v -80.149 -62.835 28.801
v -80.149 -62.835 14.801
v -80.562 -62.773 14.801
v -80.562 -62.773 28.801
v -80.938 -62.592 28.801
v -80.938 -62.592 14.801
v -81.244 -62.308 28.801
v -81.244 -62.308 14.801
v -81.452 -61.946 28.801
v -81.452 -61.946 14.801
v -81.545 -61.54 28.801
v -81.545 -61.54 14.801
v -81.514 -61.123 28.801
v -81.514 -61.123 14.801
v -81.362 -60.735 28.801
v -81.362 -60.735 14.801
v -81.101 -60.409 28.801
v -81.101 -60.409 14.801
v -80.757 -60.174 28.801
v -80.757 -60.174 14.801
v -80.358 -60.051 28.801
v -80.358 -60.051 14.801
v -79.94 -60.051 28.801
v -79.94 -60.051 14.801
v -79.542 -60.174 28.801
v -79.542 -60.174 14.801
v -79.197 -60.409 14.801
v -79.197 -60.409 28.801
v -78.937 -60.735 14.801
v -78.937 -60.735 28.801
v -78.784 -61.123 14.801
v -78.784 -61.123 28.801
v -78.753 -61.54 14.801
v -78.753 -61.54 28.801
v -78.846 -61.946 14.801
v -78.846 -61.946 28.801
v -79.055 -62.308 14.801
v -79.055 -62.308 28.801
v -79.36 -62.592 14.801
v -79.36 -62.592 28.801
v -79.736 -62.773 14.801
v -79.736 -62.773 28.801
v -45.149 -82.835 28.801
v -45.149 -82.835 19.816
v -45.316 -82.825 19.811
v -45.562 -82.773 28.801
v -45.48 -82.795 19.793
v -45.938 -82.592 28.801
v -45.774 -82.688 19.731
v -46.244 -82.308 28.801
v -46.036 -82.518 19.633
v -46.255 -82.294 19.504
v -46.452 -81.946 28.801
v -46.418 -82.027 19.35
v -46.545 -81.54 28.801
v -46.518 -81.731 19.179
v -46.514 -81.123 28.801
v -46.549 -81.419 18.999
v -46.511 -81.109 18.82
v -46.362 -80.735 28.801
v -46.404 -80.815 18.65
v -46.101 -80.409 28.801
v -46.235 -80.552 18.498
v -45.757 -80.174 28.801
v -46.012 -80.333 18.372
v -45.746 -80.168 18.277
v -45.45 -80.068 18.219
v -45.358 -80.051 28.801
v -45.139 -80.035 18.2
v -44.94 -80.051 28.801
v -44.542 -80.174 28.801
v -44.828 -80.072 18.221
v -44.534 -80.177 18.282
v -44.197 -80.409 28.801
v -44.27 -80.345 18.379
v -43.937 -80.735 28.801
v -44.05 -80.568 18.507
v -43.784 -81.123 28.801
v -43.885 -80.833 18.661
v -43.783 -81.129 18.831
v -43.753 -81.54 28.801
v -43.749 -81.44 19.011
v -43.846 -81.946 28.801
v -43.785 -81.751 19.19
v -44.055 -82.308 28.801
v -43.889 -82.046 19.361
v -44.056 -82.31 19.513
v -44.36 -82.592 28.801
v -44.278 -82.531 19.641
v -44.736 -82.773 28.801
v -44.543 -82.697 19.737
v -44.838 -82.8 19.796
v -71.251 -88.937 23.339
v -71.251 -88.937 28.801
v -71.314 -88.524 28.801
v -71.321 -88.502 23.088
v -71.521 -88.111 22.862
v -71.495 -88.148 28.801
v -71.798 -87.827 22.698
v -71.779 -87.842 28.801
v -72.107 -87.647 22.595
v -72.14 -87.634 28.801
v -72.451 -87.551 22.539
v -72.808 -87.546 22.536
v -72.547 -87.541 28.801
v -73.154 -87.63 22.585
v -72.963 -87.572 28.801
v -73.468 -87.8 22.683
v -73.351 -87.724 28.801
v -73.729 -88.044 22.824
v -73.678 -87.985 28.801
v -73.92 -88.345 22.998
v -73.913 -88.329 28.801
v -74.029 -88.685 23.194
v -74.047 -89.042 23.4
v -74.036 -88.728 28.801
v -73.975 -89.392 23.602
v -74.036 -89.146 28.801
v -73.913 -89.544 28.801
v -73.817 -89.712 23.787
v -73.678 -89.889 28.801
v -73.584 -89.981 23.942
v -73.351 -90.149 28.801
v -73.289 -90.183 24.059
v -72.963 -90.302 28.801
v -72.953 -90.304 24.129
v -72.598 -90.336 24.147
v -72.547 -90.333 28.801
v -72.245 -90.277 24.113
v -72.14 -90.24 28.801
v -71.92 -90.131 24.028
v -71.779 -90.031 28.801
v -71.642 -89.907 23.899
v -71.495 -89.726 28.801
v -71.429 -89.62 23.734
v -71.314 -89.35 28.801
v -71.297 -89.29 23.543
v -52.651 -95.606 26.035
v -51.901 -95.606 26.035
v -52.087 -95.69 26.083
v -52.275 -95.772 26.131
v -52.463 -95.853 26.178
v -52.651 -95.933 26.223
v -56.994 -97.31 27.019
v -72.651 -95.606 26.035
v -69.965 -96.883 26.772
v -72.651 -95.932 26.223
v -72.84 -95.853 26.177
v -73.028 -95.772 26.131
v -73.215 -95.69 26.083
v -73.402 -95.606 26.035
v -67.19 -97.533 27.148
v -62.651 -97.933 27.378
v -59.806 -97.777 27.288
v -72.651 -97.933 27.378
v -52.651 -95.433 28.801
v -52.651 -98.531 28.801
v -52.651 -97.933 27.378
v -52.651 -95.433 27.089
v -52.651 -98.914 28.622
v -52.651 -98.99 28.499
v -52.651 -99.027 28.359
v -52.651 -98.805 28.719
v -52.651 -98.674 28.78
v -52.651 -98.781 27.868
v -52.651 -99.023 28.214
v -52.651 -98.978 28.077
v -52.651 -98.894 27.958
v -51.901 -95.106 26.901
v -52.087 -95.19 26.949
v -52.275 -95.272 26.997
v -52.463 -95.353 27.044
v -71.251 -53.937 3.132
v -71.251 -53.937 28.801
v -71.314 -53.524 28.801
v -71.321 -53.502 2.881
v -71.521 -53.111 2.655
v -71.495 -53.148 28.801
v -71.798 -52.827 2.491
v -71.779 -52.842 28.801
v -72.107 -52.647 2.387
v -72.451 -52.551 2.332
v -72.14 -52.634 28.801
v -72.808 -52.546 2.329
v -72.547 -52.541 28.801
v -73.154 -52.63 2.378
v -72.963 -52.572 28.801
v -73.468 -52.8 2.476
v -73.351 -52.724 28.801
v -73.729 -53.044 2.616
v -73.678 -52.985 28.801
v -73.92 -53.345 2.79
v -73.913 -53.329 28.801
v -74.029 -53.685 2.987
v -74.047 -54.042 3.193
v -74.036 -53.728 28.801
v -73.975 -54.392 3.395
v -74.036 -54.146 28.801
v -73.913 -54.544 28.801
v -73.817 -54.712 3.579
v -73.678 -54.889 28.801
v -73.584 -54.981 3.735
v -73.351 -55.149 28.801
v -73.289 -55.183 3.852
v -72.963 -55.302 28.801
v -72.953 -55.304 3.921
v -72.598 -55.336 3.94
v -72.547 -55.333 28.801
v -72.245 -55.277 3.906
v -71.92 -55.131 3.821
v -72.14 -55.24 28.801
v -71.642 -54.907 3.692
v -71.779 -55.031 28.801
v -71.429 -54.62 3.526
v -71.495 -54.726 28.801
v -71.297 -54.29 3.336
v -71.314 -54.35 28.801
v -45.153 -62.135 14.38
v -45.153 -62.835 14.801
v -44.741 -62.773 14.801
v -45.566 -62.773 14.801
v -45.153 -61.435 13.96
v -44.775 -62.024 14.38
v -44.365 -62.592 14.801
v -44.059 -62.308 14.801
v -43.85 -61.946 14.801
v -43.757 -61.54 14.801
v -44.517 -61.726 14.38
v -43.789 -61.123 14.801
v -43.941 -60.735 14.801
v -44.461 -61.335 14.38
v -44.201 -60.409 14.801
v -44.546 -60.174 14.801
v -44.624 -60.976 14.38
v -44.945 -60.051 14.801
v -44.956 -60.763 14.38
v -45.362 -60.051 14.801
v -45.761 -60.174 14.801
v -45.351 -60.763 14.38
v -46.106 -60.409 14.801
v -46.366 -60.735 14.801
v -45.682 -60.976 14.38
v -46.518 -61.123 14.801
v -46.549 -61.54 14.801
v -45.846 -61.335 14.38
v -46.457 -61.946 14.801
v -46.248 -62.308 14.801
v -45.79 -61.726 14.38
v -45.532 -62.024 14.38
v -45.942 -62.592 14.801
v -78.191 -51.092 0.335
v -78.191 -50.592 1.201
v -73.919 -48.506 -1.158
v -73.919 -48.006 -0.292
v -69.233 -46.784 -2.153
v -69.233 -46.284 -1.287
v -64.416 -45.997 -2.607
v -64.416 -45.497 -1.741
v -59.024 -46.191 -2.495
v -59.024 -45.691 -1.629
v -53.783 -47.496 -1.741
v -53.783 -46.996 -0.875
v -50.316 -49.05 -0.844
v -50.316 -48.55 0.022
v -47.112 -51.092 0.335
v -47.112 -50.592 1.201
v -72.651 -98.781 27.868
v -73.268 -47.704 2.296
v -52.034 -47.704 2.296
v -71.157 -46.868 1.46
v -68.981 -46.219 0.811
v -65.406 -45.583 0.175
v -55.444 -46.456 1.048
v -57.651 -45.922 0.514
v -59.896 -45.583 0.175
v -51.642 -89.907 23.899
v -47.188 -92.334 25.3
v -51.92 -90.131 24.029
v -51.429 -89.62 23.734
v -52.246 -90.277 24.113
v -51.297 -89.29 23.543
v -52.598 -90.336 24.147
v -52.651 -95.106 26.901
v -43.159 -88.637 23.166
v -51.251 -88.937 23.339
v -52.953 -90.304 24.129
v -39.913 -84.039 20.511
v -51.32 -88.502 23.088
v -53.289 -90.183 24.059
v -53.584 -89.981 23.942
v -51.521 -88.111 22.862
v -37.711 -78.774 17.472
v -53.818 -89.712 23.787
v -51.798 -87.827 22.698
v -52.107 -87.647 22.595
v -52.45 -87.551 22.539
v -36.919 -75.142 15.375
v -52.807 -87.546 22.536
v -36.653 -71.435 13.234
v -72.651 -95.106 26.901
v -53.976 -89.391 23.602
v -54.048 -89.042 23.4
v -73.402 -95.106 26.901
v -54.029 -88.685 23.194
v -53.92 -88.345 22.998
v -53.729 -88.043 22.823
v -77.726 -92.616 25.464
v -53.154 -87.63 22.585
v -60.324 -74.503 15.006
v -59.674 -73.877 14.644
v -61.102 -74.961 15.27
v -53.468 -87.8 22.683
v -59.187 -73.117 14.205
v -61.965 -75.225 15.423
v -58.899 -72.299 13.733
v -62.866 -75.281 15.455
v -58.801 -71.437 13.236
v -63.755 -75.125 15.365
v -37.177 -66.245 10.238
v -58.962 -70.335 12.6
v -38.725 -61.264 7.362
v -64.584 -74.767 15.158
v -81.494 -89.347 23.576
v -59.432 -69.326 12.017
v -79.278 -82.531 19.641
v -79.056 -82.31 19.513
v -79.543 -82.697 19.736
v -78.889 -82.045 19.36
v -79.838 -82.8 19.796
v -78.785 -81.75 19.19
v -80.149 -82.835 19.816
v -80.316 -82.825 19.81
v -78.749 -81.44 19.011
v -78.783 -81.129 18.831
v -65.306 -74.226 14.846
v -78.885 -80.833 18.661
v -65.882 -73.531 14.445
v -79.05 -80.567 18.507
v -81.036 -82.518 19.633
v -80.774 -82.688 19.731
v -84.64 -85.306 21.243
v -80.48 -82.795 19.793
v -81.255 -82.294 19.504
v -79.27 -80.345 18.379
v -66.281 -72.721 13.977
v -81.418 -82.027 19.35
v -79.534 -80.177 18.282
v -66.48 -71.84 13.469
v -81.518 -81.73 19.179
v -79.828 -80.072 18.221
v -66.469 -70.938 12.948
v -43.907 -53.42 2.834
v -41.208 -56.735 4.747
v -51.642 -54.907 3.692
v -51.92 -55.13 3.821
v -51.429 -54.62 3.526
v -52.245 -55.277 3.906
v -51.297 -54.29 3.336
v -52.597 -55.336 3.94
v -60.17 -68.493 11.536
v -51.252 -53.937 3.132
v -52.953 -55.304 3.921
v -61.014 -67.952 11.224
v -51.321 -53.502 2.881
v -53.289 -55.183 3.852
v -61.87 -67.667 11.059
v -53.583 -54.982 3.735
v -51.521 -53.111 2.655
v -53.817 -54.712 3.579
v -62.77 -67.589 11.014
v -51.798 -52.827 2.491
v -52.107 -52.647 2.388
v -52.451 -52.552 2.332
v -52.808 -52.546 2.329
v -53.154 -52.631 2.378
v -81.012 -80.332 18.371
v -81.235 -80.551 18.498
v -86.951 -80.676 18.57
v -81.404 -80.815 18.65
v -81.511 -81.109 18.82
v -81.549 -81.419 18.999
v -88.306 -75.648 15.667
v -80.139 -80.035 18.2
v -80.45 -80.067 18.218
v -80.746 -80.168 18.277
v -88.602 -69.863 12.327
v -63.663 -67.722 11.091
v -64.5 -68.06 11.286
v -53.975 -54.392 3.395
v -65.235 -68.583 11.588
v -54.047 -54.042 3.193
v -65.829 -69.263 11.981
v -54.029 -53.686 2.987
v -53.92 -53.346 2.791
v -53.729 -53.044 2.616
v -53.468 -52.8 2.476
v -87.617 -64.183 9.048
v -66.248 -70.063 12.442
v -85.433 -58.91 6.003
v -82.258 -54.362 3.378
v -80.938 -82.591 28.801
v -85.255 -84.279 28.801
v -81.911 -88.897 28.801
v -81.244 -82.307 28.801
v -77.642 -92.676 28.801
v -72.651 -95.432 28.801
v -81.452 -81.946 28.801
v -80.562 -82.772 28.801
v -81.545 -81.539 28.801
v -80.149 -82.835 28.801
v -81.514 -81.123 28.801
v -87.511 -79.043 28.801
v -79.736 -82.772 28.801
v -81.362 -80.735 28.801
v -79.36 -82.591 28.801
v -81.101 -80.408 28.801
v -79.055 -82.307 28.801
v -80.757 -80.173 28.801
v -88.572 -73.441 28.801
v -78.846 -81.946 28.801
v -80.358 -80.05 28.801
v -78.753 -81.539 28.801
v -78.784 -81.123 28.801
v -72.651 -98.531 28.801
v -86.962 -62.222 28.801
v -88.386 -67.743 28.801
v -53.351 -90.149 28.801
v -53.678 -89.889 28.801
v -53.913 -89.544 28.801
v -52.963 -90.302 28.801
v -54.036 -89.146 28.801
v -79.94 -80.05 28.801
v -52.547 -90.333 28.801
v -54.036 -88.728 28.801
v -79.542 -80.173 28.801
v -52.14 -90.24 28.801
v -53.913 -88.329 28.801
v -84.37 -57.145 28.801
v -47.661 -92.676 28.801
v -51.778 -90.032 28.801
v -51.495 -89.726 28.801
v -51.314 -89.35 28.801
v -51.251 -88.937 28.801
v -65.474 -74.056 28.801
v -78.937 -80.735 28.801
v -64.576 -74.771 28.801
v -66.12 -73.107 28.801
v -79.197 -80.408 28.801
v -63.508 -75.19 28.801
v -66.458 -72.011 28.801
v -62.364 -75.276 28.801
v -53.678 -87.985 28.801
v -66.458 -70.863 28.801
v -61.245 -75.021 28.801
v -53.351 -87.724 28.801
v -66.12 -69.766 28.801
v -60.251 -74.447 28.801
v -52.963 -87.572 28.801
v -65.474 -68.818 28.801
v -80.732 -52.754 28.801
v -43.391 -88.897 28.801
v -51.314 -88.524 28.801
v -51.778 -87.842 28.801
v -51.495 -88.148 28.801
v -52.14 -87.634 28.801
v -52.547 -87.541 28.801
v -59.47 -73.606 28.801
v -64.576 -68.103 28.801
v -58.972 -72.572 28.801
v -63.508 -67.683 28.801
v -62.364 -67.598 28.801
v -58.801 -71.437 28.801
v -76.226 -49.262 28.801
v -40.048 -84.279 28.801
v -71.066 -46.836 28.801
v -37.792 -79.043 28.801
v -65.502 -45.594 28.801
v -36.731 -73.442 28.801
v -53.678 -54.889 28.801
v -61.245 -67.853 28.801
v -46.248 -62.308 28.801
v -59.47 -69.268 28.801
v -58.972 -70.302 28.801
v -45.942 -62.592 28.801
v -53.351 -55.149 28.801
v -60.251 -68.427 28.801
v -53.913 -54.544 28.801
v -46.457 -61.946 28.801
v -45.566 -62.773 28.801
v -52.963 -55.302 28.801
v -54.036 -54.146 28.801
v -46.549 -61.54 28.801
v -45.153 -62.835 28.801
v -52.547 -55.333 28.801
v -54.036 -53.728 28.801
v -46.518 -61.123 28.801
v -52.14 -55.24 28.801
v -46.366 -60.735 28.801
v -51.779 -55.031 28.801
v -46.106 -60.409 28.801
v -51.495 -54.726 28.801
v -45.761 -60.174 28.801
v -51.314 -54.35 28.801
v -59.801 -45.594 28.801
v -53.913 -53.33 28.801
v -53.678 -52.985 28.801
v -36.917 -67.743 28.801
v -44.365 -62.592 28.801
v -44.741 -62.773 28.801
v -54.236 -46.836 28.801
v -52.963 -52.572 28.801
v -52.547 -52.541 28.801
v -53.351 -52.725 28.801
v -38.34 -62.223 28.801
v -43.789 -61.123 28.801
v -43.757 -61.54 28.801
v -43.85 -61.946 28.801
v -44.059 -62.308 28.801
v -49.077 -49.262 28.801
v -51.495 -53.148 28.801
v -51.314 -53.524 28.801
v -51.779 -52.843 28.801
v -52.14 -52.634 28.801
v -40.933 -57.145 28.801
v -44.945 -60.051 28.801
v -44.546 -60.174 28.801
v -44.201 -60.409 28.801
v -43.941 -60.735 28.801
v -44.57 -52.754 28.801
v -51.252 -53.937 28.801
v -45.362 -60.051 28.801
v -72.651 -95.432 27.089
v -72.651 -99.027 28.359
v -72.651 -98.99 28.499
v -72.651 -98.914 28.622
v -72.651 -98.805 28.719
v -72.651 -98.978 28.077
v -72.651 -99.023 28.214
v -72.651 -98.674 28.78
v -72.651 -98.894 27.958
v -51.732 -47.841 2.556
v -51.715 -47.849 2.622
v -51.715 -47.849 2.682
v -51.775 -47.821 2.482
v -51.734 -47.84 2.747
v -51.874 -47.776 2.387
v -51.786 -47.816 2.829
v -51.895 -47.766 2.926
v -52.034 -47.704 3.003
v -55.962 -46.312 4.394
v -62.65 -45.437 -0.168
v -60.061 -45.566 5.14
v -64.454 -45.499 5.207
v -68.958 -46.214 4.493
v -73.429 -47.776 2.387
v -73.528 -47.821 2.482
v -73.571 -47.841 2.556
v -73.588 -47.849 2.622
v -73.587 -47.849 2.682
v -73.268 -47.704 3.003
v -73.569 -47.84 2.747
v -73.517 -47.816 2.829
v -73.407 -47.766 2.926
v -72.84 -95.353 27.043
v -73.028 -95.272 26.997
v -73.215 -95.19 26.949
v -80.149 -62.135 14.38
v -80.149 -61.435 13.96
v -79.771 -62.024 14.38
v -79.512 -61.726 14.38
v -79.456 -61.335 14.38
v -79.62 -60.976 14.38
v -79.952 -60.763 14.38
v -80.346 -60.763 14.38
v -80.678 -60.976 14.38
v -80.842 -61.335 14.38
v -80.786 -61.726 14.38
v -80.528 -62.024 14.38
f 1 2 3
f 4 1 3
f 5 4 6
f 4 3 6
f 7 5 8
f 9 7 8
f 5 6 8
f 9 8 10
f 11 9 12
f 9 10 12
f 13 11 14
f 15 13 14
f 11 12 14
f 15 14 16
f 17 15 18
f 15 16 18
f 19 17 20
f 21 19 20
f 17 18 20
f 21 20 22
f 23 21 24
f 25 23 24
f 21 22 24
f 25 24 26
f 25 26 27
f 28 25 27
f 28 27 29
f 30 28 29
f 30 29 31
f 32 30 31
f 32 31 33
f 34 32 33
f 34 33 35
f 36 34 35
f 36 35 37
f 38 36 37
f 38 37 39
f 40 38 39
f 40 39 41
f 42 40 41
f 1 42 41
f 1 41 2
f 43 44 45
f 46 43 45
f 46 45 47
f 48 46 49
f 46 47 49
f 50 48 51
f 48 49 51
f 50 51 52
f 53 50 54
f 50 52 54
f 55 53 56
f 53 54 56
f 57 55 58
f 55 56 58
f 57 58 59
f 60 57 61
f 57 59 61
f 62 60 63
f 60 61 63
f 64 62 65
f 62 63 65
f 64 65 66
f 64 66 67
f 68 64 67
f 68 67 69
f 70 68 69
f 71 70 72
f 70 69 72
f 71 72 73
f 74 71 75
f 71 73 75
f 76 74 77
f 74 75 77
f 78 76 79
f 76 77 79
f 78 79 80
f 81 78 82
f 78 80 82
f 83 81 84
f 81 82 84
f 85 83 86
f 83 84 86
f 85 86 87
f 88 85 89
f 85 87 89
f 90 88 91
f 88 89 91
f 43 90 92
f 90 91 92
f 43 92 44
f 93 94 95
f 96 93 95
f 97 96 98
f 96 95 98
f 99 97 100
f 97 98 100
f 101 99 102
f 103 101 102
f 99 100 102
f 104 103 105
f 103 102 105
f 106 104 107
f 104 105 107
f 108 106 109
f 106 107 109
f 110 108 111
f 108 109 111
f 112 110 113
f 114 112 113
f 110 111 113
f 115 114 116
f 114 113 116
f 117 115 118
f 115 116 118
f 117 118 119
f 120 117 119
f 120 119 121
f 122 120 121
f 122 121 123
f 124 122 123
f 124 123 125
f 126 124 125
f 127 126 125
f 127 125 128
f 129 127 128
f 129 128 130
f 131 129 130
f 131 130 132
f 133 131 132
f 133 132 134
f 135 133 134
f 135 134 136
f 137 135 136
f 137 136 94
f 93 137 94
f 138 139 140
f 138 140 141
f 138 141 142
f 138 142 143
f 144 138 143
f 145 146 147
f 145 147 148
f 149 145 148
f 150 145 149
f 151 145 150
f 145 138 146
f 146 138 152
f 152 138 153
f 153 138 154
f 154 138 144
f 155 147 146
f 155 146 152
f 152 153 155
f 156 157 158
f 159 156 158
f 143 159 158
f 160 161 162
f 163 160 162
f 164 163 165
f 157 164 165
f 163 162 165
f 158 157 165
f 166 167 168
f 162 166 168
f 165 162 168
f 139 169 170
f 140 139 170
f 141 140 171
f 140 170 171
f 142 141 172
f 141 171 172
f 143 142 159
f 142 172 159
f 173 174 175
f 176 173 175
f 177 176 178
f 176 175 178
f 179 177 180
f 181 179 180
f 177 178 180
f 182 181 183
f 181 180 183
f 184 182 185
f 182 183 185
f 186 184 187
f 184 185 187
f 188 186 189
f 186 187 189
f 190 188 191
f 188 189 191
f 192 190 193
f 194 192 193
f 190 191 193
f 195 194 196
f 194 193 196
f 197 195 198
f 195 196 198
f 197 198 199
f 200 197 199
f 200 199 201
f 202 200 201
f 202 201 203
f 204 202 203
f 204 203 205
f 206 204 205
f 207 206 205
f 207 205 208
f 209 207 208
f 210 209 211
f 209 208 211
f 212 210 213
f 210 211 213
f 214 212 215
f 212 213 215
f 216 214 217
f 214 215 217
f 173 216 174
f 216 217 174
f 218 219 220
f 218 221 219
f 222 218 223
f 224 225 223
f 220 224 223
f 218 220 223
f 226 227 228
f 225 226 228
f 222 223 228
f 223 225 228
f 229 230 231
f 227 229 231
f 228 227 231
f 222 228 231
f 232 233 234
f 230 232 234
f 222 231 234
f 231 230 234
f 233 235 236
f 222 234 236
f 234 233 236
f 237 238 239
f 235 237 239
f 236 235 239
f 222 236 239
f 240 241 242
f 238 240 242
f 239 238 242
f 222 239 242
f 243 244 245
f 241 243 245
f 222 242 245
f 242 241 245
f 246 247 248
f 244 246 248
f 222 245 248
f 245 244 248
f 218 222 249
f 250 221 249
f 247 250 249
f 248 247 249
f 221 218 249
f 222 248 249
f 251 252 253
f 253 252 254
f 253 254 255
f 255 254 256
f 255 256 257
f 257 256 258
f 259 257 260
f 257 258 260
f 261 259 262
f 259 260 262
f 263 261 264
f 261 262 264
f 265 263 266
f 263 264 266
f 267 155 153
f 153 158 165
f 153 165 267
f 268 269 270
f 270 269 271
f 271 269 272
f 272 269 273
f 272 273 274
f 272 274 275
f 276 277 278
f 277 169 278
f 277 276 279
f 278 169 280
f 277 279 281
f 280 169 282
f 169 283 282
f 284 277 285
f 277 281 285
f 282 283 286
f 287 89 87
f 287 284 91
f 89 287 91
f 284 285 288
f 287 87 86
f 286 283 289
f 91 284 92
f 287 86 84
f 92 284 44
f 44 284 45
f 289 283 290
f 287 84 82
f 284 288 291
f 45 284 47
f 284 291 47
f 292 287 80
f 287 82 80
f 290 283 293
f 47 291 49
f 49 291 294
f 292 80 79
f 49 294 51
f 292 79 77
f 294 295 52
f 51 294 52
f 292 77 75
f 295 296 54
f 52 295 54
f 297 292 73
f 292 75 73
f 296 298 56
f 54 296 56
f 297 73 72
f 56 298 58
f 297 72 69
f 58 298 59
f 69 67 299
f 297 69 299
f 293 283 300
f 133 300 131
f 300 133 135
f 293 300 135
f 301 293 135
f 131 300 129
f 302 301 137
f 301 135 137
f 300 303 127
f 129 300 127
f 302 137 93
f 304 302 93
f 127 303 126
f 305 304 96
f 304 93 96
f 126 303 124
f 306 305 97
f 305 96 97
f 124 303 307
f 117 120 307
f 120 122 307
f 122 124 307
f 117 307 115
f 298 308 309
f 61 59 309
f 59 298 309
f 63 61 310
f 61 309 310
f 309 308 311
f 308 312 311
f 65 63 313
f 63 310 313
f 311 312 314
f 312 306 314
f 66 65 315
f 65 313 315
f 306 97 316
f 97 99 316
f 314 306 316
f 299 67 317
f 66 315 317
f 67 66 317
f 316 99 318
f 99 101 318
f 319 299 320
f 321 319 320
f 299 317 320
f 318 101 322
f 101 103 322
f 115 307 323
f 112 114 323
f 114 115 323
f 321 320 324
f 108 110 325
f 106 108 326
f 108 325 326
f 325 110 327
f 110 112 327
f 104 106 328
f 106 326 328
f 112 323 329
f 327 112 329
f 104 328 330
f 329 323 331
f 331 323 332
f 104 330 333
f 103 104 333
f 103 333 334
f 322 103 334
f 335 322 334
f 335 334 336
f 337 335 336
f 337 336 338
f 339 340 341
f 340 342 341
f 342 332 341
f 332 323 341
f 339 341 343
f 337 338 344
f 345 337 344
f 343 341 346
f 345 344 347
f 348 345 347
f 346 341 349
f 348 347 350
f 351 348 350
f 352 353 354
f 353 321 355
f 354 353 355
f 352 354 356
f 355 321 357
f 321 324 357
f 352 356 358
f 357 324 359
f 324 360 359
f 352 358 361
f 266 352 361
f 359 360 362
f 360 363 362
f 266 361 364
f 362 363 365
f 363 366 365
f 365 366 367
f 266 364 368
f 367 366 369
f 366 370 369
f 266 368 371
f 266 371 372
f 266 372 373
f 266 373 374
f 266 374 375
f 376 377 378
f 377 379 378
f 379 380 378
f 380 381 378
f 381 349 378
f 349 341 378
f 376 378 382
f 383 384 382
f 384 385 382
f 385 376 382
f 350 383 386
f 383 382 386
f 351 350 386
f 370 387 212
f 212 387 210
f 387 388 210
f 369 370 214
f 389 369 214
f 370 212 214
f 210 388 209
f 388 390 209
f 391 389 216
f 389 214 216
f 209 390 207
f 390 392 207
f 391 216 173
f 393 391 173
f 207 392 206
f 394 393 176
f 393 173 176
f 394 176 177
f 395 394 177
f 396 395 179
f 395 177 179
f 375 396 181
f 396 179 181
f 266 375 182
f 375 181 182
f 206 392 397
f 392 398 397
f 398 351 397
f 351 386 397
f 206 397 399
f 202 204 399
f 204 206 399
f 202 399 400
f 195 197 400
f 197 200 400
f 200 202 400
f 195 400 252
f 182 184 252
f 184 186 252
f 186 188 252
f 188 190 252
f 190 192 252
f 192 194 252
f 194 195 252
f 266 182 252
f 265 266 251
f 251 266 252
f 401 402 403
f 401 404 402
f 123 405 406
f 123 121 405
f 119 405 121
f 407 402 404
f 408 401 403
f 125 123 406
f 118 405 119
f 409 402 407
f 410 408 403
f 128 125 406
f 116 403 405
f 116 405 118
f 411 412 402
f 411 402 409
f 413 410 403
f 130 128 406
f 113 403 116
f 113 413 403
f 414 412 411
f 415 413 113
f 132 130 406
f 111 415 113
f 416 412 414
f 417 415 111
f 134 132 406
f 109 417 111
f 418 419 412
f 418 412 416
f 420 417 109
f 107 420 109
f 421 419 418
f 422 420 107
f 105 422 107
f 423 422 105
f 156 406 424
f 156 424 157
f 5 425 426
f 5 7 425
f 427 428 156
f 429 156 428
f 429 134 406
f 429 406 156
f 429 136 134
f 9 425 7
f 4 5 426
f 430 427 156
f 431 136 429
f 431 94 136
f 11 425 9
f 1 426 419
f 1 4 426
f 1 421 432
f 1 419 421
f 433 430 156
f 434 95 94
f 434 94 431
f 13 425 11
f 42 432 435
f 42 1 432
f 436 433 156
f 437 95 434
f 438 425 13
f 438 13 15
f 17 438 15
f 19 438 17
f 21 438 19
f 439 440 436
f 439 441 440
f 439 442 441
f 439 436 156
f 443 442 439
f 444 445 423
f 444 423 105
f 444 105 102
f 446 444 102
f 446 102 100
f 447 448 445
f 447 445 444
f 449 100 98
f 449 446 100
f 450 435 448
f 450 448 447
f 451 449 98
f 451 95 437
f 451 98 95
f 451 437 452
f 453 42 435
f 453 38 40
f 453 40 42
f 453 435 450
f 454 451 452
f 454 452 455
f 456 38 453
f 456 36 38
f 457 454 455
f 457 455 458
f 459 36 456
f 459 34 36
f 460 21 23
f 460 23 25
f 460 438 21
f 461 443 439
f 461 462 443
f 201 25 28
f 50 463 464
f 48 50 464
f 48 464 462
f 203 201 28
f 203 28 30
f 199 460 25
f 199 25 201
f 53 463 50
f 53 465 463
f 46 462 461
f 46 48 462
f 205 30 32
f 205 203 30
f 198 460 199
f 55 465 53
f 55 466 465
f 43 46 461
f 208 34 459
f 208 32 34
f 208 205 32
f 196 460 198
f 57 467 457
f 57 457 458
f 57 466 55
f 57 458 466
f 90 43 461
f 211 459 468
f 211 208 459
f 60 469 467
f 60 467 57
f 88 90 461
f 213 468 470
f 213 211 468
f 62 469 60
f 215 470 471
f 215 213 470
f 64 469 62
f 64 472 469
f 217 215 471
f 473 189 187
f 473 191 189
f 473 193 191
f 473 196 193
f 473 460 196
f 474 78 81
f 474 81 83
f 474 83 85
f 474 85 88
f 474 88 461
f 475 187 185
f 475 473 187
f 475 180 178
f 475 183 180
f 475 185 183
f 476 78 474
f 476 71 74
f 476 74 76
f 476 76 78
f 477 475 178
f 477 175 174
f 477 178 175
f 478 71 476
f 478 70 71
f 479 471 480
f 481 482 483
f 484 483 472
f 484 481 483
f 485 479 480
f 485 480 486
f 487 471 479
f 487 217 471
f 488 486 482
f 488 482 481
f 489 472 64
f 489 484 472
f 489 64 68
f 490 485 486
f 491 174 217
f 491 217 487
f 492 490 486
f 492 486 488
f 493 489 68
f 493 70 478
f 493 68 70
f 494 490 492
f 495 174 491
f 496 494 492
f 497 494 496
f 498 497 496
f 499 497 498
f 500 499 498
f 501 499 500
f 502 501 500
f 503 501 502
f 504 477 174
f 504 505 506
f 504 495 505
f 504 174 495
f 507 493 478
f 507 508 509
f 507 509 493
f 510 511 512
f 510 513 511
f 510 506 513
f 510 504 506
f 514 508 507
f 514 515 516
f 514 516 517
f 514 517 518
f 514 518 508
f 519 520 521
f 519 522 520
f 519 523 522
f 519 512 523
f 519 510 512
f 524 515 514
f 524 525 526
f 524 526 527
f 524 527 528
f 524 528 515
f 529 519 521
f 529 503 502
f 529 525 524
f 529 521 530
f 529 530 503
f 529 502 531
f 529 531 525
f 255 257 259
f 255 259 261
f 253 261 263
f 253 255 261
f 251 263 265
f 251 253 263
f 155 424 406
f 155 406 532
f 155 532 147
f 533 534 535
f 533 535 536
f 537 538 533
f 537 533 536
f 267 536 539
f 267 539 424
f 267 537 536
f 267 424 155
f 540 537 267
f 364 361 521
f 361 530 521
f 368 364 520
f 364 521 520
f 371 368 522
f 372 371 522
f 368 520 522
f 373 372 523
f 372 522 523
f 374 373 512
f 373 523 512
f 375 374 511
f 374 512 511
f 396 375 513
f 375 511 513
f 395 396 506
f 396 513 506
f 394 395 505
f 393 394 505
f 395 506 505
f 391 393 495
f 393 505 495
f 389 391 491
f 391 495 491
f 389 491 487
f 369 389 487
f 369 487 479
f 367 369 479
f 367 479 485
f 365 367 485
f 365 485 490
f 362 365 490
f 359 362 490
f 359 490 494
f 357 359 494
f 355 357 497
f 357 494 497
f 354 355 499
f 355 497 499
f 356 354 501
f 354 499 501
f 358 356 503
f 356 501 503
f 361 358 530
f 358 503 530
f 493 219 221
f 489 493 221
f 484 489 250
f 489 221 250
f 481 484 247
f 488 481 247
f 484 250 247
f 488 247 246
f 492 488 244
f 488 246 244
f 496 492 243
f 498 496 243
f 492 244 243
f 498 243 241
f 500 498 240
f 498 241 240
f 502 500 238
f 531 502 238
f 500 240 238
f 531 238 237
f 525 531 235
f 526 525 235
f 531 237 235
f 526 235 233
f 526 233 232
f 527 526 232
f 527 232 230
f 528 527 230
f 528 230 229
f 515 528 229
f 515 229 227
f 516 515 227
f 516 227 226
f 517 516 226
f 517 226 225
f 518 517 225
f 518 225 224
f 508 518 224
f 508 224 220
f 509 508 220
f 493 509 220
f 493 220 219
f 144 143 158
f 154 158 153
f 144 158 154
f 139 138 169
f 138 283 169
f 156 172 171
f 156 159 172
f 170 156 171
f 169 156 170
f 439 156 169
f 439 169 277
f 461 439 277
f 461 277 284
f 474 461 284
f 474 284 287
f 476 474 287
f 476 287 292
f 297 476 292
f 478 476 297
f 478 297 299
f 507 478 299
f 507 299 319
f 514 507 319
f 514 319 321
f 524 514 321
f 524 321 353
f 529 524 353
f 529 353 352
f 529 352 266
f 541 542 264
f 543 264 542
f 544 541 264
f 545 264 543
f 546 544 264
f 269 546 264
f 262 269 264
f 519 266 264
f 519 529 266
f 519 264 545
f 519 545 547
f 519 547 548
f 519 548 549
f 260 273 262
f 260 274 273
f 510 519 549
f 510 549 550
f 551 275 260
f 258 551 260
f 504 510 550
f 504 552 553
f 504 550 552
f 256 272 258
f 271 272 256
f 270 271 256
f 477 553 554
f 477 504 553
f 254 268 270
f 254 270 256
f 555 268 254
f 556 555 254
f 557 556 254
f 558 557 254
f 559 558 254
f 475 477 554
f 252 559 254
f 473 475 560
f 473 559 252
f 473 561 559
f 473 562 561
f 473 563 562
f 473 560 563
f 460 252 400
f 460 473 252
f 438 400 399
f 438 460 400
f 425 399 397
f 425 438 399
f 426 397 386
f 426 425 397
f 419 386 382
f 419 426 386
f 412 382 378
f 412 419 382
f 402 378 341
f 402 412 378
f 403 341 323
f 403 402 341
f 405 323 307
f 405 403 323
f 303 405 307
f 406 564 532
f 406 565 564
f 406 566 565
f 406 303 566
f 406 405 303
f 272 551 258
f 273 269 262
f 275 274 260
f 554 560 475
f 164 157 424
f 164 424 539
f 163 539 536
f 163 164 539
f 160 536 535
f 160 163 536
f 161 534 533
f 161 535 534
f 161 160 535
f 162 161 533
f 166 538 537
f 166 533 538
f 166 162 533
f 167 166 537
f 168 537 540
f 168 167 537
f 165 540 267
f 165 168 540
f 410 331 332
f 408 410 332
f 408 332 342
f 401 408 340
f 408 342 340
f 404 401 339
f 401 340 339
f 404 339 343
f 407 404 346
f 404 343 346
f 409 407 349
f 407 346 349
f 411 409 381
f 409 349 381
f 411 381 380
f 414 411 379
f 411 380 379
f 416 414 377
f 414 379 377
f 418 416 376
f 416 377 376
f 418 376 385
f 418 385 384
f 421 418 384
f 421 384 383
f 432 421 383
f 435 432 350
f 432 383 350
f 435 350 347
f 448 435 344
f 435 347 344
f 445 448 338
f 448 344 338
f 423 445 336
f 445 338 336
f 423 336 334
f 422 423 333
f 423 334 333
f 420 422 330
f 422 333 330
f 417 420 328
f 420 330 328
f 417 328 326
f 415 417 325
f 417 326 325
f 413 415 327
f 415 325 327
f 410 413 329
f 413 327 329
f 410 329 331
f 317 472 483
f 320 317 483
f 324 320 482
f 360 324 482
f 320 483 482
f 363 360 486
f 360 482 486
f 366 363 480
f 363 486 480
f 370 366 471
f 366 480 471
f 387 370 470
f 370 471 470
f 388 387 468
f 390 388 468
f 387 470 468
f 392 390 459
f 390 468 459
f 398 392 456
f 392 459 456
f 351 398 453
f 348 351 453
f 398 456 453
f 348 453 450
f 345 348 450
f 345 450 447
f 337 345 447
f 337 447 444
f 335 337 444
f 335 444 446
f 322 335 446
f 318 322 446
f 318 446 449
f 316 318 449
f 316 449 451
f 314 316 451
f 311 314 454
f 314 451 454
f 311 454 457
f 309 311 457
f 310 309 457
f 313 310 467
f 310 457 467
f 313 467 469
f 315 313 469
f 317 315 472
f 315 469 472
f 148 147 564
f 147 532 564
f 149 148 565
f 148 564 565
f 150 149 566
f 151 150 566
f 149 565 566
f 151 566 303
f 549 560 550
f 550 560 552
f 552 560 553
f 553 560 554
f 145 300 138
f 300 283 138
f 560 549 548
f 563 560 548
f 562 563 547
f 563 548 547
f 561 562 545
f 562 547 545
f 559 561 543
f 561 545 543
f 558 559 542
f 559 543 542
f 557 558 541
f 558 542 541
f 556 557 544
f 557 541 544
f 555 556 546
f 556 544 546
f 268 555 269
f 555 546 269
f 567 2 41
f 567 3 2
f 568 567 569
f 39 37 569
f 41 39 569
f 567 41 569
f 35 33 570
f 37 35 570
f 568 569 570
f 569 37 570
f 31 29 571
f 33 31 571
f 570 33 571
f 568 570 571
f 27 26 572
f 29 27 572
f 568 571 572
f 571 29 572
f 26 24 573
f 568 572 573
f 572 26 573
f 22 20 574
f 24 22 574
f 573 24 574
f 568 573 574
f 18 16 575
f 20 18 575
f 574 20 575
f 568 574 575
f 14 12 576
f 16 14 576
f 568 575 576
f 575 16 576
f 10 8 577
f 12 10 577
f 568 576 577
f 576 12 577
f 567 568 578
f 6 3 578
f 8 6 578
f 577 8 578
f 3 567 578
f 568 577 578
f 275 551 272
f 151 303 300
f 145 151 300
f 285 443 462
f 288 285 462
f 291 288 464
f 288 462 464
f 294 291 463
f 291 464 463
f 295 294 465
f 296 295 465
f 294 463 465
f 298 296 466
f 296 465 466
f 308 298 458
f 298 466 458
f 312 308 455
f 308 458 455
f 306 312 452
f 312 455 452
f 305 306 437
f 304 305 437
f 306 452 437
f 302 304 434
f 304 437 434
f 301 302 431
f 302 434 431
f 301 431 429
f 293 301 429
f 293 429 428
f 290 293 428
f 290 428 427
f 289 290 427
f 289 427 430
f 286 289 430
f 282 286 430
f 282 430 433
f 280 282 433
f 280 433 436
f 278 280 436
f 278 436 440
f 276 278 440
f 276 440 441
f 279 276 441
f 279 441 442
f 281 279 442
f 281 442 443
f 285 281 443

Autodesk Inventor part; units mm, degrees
ref_plane "YZ Plane" through (0, 0, 0) normal (1, 0, 0) x (0, 1, 0)
ref_plane "XZ Plane" through (0, 0, 0) normal (0, 1, 0) x (-1, 0, 0)
ref_plane "Work Plane1" through (-54.6514, -58.9369, 28.8009) normal (0, 0, -1) x (-1, 0, 0)
ref_plane "Arbeitsebene5" through (-88.1514, -83.8908, 20.4259) normal (0, 0.5, 0.8660254) x (1, 0, 0)
sketch "Sketch1" plane through (-50.6514, -58.9369, 28.8009) normal (0, 0, 1) x (1, 0, 0)
  circle A0 centre (-11.9999, -12.4979) radius 25.9979 projected
  circle A1 centre (-2, 4.9999) radius 1.3999 projected
  circle A2 centre (-22, 5) radius 1.4 projected
  circle A3 centre (-12, -12.5) radius 3.85 projected
  line L0 (-5, -5) -> (-5, 0) projected
  line L1 (0, 0) -> (0, -5) projected
  circle A4 centre (-22, -30) radius 1.4 projected
  circle A5 centre (-2, -30) radius 1.4001 projected
  line L2 (-5, 0) -> (0, 0)
  line L3 (0, 0) -> (0, -5)
  line L4 (0, -5) -> (-5, -5)
  line L5 (-5, -5) -> (-5, 0)
  circle A6 centre (-12, -12.5) radius 4
  point P0 (50.6514, 58.9369)
  dimension "d2" = 8
extrude "Extrusion1" add sketch "Sketch1" against normal up to surface contours A0 | L0 L2 L1 L4 | A6 surface through (-88.1514, -83.8908, 20.4259) normal (0, 0.5, 0.8660254)
sketch "Skizze17" plane through (-62.6512, -71.4348, 13.2343) normal (0, -0.5, -0.8660254) x (-1, 0, 0)
  line L0 (23.5002, 23.867) -> (-23.4998, 23.867) projected
  arc A0 (-23.4998, 23.867) -> (-25.4998, 21.867) centre (-23.4998, 21.867) ccw projected
  line L1 (-25.4998, 21.867) -> (-25.4998, -25.133) projected
  arc A1 (-25.4998, -25.133) -> (-23.4998, -27.133) centre (-23.4998, -25.133) ccw projected
  line L2 (-23.4998, -27.133) -> (23.5002, -27.133) projected
  arc A2 (23.5002, -27.133) -> (25.5002, -25.133) centre (23.5002, -25.133) ccw projected
  line L3 (25.5002, -25.133) -> (25.5002, 21.867) projected
  arc A3 (25.5002, 21.867) -> (23.5002, 23.867) centre (23.5002, 21.867) ccw projected
  line L4 (-17.4998, 11.367) -> (17.5002, 11.367) projected
  line L5 (17.5002, 11.367) -> (17.5002, -12.633) projected
  line L6 (17.5002, -12.633) -> (-17.4998, -12.633) projected
  line L7 (-17.4998, -12.633) -> (-17.4998, 11.367) projected
  line L8 (-23.4998, 24.067) -> (23.5002, 24.067)
  arc A4 (25.7002, 21.867) -> (23.5002, 24.067) centre (23.5002, 21.867) ccw
  line L9 (25.7002, 21.867) -> (25.7002, -25.133)
  arc A5 (23.5002, -27.333) -> (25.7002, -25.133) centre (23.5002, -25.133) ccw
  line L10 (23.5002, -27.333) -> (-23.4998, -27.333)
  arc A6 (-25.6998, -25.133) -> (-23.4998, -27.333) centre (-23.4998, -25.133) ccw
  line L11 (-25.6998, -25.133) -> (-25.6998, 21.867)
  arc A7 (-23.4998, 24.067) -> (-25.6998, 21.867) centre (-23.4998, 21.867) ccw
  ellipse E0 centre (-9.9998, 20.2048) end of major axis (-9.9998, 21.8213) minor radius 1.3999 projected
  ellipse E1 centre (10.0001, 20.2048) end of major axis (10.0001, 21.8213) minor radius 1.4 projected
  ellipse E2 centre (0.0001, -0.0025) end of major axis (0.0001, 4.4432) minor radius 3.85 projected
  ellipse E3 centre (10.0001, -20.2097) end of major axis (10.0001, -18.5931) minor radius 1.4 projected
  ellipse E4 centre (-9.9999, -20.2096) end of major axis (-9.9999, -18.593) minor radius 1.4001 projected
  ellipse E5 centre (0, 0) end of major axis (0, -30.0198) minor radius 25.9979 projected
  point P0 (-62.6512, 68.4815)
  point P1 (15.5395, 24.067)
  point P2 (-15.5395, 24.067)
  point P3 (10.7503, -27.333)
  point P4 (-10.7503, -27.333)
  dimension "d65" = 0.2
extrude "Extrusion13" add sketch "Skizze17" along normal blind 1 contours L8 E5 | E5 L10
ref_plane "Arbeitsebene6" through (-62.6514, -59.1868, 48.3009) normal (-1, 0, 0) x (0, 0, -1)
sketch "Skizze18" plane through (-62.6514, -59.1868, 48.3009) normal (-1, 0, 0) x (0, 0, -1)
  line L0 (47.1, -8.5947) -> (47.1, -8.5947) projected
  line L1 (47.1, -8.5947) -> (47.966, -8.0947) projected
  line L2 (47.966, -8.0947) -> (47.966, -8.0947) projected
  line L3 (47.1, -8.5947) -> (47.966, -8.0947) projected
  line L4 (21.4, 35.919) -> (21.4, 35.919) projected
  line L5 (21.4, 35.919) -> (22.266, 36.419) projected
  line L6 (22.266, 36.419) -> (22.266, 36.419) projected
  line L7 (21.4, 35.919) -> (22.266, 36.419) projected
  line L8 (21.4, 35.919) -> (22.266, 36.419) projected
  line L9 (22.266, 36.419) -> (19.5, 34.8221)
  line L10 (19.5, 38.2458) -> (19.5, -13.75) projected
  line L11 (22.266, 36.419) -> (19.5, 34.8221)
  line L12 (22.266, 36.419) -> (20.9226, 38.7458) projected
  line L13 (22.266, 36.419) -> (20.433, 39.5939)
  line L14 (19.5, 39.3439) -> (19.5, 34.8221)
  arc A0 (20.433, 39.5939) -> (19.5, 39.3439) centre (20, 39.3439) ccw
  point P0 (48.3009, -59.1868)
  point P1 (19.5, 38.2458)
  point P2 (20.9226, 38.7458)
  dimension "d68" = 0.5
extrude "Extrusion14" add sketch "Skizze18" along normal mid plane 20
sketch "Skizze19" plane through (-62.6514, -59.1868, 48.3009) normal (-1, 0, 0) x (0, 0, -1)
  line L0 (47.1, -8.5947) -> (47.1, -8.5947) projected
  line L1 (47.1, -8.5947) -> (47.966, -8.0947) projected
  line L2 (47.966, -8.0947) -> (47.966, -8.0947) projected
  line L3 (47.1, -8.5947) -> (47.966, -8.0947) projected
  line L4 (48.1255, -13.6035) -> (46.0052, -11.4832)
  line L5 (48.4791, -13.75) -> (51.4776, -13.75) construction
  line L6 (45.2981, -11.4832) -> (43.0314, -13.75)
  line L7 (19.5, -13.75) -> (50.0764, -13.75) projected
  line L8 (43.0314, -13.75) -> (48.272, -13.75)
  arc A0 (46.0052, -11.4832) -> (45.2981, -11.4832) centre (45.6517, -11.8368) ccw
  arc A1 (48.1255, -13.6035) -> (48.4791, -13.75) centre (48.4791, -13.25) ccw
  point P0 (48.3009, -59.1868)
  point P1 (48.4791, -13.75)
  dimension "d71" = 135
  dimension "d72" = 90
  dimension "d73" = 0.5
extrude "Extrusion15" cut sketch "Skizze19" along normal through all both and the other way through all
sketch "Skizze20" plane through (-50.6514, -58.9369, 28.8009) normal (0, 0, 1) x (1, 0, 0)
  circle A0 centre (-29.4977, -2.4981) radius 1.3999
  circle A1 centre (-29.4977, -22.498) radius 1.4
  circle A2 centre (-11.9977, -12.498) radius 3.85
  circle A3 centre (5.5022, -22.498) radius 1.4
  circle A4 centre (5.5022, -2.498) radius 1.4001
  arc A5 (-2.0001, -36.4957) -> (-22.0001, -36.4955) centre (-11.9999, -12.4979) ccw
  line L0 (-22.0001, -39.5939) -> (-22.0001, -36.4955)
  line L1 (-22.0001, -39.5939) -> (-2.0001, -39.5939)
  line L2 (-2.0001, -36.4957) -> (-2.0001, -39.5939)
  line L3 (5.498, -22.4977) -> (5.498, -2.4981)
  line L4 (5.498, -2.4981) -> (-29.4977, -2.4981)
  line L5 (-29.4977, -2.4981) -> (-29.4977, -22.4977)
  line L6 (-29.4977, -22.4977) -> (5.498, -22.4977)
  line L7 (5.498, -22.4977) -> (-29.4977, -2.4981) construction
  line L8 (5.498, -2.4981) -> (-29.4977, -22.4977) construction
  point P0 (50.6514, 58.9369)
hole "Bohrung3" at (-80.1491, -61.4349, 28.8009) at (-80.1491, -81.4346, 28.8009) at (-45.1491, -81.4349, 28.8009) at (-45.1534, -61.4349, 28.8009) direction (0, 0, -1) diameter 2.8 depth 14 tip angle 118
properties part number "Spectrometer_gratingholder_v0"
